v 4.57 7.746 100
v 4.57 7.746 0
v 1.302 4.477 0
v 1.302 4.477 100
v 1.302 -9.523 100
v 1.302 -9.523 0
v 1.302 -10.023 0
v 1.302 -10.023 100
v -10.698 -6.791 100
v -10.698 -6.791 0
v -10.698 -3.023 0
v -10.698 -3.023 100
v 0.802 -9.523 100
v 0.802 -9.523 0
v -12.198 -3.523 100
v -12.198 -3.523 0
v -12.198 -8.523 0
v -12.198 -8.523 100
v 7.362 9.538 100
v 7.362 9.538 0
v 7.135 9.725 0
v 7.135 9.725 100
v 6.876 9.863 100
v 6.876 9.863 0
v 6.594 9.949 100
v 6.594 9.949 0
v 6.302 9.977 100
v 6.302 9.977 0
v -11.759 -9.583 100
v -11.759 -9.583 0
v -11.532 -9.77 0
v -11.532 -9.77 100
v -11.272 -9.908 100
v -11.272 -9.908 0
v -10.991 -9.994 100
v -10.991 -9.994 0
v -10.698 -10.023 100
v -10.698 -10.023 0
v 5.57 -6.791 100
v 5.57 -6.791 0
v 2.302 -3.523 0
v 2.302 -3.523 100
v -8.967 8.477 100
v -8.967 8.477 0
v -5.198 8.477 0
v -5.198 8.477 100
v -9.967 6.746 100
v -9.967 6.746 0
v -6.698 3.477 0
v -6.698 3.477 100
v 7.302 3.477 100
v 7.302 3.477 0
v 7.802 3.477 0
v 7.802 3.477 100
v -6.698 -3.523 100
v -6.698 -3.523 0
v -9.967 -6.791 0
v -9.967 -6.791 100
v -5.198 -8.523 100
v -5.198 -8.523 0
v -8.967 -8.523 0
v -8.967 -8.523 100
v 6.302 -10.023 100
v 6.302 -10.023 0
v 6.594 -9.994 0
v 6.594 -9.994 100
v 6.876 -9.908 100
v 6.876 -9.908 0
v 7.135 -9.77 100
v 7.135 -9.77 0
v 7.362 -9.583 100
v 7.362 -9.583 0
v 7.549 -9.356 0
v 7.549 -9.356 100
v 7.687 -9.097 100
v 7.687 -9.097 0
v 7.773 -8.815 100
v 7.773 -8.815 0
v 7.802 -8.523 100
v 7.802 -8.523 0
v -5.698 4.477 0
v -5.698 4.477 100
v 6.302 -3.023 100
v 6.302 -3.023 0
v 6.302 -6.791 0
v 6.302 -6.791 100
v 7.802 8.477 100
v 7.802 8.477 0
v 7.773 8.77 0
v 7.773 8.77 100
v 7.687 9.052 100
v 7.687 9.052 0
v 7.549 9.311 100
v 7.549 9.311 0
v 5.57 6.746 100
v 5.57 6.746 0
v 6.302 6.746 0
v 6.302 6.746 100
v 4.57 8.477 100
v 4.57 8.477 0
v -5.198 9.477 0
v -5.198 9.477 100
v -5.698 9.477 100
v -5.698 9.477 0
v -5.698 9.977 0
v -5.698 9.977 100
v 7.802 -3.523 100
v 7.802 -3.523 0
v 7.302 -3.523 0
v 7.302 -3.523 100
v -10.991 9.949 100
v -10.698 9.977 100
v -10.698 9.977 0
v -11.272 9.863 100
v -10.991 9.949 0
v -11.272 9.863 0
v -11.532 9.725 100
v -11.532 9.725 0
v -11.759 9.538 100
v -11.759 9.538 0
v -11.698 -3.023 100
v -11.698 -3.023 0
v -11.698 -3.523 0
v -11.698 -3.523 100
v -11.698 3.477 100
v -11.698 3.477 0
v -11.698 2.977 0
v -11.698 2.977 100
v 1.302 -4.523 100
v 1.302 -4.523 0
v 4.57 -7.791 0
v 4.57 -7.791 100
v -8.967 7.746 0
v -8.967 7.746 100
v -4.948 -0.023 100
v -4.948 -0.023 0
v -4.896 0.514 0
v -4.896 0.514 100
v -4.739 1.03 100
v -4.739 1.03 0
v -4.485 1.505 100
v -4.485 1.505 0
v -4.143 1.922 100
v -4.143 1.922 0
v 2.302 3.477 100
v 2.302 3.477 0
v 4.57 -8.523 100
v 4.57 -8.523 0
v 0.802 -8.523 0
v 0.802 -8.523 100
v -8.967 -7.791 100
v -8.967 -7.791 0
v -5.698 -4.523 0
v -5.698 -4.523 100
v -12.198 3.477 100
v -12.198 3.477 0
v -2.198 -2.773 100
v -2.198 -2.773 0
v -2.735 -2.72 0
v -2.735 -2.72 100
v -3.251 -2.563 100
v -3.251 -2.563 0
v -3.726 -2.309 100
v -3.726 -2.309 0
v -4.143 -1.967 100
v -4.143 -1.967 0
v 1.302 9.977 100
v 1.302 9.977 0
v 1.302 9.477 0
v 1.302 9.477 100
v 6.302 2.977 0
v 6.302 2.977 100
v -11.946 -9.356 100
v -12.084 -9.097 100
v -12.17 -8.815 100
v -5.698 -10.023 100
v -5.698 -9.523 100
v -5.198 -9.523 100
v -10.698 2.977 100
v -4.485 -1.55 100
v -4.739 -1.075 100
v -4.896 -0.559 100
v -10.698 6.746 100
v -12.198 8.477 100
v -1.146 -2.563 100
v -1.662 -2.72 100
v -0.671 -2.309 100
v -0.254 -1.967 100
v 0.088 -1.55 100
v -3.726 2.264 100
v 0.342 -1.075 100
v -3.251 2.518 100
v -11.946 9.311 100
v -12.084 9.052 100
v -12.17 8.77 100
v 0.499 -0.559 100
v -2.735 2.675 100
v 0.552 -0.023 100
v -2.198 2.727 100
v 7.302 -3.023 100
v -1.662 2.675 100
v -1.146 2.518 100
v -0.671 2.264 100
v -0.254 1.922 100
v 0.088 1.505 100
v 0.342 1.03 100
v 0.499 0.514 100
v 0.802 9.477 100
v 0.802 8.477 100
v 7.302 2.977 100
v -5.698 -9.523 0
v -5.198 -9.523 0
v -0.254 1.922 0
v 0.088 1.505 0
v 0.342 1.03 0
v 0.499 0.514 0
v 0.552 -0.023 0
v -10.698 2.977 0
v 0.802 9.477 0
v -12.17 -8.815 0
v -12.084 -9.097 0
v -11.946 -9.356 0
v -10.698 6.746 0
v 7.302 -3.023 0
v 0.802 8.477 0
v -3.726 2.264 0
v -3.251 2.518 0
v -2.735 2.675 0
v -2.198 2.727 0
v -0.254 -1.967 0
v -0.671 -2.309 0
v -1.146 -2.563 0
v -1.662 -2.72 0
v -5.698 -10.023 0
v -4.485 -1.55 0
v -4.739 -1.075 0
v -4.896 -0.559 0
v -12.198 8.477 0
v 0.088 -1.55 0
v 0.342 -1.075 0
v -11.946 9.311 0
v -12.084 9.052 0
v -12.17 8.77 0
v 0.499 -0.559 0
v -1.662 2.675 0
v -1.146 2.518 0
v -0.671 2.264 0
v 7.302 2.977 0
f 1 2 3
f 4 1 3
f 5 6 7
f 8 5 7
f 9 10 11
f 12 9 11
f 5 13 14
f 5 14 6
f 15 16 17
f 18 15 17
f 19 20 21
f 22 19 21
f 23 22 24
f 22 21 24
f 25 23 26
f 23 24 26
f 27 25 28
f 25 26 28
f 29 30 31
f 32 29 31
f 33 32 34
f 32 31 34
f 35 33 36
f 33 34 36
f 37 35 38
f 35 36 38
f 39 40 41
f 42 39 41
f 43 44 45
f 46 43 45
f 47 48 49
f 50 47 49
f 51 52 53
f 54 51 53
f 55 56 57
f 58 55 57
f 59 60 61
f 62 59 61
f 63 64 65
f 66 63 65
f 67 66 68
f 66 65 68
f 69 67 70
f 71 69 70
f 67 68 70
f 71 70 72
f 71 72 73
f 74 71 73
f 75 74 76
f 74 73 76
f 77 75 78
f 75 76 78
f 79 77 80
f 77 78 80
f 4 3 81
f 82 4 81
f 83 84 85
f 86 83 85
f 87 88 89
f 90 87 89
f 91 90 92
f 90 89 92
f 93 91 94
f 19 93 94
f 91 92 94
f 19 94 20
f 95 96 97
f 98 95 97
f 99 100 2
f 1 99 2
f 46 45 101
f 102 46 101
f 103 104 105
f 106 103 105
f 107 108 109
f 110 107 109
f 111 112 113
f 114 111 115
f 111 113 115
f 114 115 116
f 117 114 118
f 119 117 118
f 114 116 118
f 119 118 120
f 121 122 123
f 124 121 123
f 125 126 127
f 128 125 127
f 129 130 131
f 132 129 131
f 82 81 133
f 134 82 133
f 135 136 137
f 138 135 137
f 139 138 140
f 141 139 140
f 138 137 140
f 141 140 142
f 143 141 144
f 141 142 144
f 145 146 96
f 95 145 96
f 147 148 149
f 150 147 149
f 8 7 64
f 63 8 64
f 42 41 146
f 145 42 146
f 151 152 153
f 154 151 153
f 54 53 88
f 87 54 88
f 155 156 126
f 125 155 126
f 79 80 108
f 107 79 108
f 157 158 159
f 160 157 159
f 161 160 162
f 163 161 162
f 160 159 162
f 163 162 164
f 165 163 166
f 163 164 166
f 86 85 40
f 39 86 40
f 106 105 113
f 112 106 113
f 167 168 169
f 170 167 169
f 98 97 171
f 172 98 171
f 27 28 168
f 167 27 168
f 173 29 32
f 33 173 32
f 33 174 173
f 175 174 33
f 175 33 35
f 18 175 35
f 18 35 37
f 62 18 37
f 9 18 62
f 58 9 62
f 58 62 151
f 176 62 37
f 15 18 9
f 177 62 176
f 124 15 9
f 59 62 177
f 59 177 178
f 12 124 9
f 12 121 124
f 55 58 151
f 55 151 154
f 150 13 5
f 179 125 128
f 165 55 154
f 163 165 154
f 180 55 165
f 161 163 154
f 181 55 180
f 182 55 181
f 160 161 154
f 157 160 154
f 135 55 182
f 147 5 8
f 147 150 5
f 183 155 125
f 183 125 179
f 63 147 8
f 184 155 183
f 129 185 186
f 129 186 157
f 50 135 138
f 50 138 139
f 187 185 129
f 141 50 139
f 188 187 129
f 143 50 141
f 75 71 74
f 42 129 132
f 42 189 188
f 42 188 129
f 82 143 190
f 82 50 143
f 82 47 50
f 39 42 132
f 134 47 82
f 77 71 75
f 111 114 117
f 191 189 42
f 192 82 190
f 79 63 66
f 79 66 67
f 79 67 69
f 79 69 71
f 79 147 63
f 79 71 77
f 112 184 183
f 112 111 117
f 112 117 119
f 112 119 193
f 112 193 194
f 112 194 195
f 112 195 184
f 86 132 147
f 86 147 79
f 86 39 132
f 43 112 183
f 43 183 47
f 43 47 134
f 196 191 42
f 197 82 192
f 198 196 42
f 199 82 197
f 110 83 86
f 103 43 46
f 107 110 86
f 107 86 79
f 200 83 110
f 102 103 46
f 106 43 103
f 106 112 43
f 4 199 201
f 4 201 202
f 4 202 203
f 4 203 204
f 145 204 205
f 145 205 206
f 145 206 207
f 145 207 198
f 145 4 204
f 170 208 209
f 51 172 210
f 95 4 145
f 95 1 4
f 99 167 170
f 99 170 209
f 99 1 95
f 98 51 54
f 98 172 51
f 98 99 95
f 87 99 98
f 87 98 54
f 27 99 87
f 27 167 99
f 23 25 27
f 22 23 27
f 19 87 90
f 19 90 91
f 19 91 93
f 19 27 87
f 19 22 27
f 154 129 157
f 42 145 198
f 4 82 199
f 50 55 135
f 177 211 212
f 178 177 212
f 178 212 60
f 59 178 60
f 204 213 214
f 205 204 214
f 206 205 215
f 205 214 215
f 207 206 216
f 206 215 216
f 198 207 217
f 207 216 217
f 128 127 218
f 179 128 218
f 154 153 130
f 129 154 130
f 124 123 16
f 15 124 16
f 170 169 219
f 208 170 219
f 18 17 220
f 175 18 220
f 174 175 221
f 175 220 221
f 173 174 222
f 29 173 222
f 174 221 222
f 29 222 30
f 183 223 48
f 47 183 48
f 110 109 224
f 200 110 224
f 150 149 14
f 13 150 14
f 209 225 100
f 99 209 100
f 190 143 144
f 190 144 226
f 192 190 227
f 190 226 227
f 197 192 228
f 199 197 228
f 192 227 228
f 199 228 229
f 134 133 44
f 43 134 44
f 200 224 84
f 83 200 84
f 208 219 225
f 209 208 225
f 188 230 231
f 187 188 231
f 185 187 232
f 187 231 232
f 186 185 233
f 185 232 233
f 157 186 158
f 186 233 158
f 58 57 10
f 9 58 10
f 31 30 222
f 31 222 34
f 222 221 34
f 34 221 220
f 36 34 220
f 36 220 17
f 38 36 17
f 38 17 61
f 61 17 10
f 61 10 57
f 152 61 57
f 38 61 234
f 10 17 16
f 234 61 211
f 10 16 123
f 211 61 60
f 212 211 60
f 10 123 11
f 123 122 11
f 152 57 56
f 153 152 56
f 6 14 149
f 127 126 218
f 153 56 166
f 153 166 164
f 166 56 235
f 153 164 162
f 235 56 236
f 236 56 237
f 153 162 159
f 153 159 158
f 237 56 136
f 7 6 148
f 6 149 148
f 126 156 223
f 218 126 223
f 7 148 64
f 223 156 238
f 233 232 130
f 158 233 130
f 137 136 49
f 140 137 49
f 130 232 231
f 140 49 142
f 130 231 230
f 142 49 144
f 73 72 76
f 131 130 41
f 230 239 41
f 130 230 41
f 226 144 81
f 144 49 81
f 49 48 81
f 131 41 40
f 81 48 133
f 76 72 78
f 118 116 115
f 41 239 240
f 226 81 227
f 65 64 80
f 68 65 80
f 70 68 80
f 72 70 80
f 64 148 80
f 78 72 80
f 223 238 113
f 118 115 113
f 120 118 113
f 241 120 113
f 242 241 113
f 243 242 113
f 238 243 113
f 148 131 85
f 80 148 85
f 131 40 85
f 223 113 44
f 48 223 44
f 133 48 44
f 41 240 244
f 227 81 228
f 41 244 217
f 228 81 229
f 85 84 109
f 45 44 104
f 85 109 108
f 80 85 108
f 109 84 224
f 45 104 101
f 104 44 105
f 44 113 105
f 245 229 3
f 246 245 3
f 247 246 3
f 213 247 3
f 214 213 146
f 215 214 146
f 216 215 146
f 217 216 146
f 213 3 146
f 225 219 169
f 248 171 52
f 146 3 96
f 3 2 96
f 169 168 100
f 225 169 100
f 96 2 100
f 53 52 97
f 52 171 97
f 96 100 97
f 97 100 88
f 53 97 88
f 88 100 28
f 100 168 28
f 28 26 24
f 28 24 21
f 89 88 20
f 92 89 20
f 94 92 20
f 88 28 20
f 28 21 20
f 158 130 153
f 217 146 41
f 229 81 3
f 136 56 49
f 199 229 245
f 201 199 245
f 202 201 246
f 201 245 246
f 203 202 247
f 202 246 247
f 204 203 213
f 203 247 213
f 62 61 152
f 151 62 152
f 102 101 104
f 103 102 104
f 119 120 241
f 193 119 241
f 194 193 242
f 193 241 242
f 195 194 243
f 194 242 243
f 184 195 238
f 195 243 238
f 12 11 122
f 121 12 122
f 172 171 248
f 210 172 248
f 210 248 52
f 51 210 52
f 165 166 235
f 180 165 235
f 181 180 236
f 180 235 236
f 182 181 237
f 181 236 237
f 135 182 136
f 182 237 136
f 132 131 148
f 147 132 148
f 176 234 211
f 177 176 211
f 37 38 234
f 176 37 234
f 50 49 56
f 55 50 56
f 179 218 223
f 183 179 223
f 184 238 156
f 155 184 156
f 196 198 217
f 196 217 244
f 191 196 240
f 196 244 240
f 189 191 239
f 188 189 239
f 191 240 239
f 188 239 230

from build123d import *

# Parameters (mm, degrees)
F1_DEPTH = 100


with BuildPart() as f1:
    # F0 (on Top) → F1 (new body)
    with BuildSketch(Plane.XY):
        with BuildLine():
            Line((-5.698349, -4.52252), (-1.198349, -4.52252))
            Line((-1.198349, -4.52252), (1.301651, -4.52252))
            Line((1.301651, -4.52252), (4.569926, -7.790794))
            Line((4.569926, -7.790794), (4.569926, -8.52252))
            Line((4.569926, -8.52252), (0.801651, -8.52252))
            Line((0.801651, -8.52252), (0.801651, -9.52252))
            Line((0.801651, -9.52252), (1.301651, -9.52252))
            Line((1.301651, -9.52252), (1.301651, -10.02252))
            Line((1.301651, -10.02252), (3.365556, -10.02252))
            Line((3.365556, -10.02252), (6.301651, -10.02252))
            ThreePointArc((6.301651, -10.02252), (6.875677, -9.908339), (7.362312, -9.58318))
            Line((7.362312, -9.58318), (6.301651, -8.52252))
            Line((6.301651, -8.52252), (-0.253805, -1.967063))
            ThreePointArc((-0.253805, -1.967063), (-1.145969, -2.563188), (-2.198349, -2.77252))
            ThreePointArc((-2.198349, -2.77252), (-3.250728, -2.563188), (-4.142892, -1.967063))
            Line((-4.142892, -1.967063), (-10.698349, -8.52252))
            Line((-10.698349, -8.52252), (-11.759009, -9.58318))
            ThreePointArc((-11.759009, -9.58318), (-11.272374, -9.908339), (-10.698349, -10.02252))
            Line((-10.698349, -10.02252), (-7.762253, -10.02252))
            Line((-7.762253, -10.02252), (-5.698349, -10.02252))
            Line((-5.698349, -10.02252), (-5.698349, -9.52252))
            Line((-5.698349, -9.52252), (-5.198349, -9.52252))
            Line((-5.198349, -9.52252), (-5.198349, -8.52252))
            Line((-5.198349, -8.52252), (-8.966623, -8.52252))
            Line((-8.966623, -8.52252), (-8.966623, -7.790794))
            Line((-8.966623, -7.790794), (-5.698349, -4.52252))
        make_face()
        with BuildLine():
            ThreePointArc((-12.198349, -8.52252), (-12.084168, -9.096545), (-11.759009, -9.58318))
            Line((-11.759009, -9.58318), (-10.698349, -8.52252))
            Line((-10.698349, -8.52252), (-4.142892, -1.967063))
            ThreePointArc((-4.142892, -1.967063), (-4.739017, -1.074899), (-4.948349, -0.02252))
            ThreePointArc((-4.948349, -0.02252), (-4.739017, 1.02986), (-4.142892, 1.922024))
            Line((-4.142892, 1.922024), (-10.698349, 8.47748))
            Line((-10.698349, 8.47748), (-11.759009, 9.538141))
            ThreePointArc((-11.759009, 9.538141), (-12.084168, 9.051506), (-12.198349, 8.47748))
            Line((-12.198349, 8.47748), (-12.198349, 5.541385))
            Line((-12.198349, 5.541385), (-12.198349, 3.47748))
            Line((-12.198349, 3.47748), (-11.698349, 3.47748))
            Line((-11.698349, 3.47748), (-11.698349, 2.97748))
            Line((-11.698349, 2.97748), (-10.698349, 2.97748))
            Line((-10.698349, 2.97748), (-10.698349, 6.745755))
            Line((-10.698349, 6.745755), (-9.966623, 6.745755))
            Line((-9.966623, 6.745755), (-6.698349, 3.47748))
            Line((-6.698349, 3.47748), (-6.698349, -1.02252))
            Line((-6.698349, -1.02252), (-6.698349, -3.52252))
            Line((-6.698349, -3.52252), (-9.966623, -6.790794))
            Line((-9.966623, -6.790794), (-10.698349, -6.790794))
            Line((-10.698349, -6.790794), (-10.698349, -3.02252))
            Line((-10.698349, -3.02252), (-11.698349, -3.02252))
            Line((-11.698349, -3.02252), (-11.698349, -3.52252))
            Line((-11.698349, -3.52252), (-12.198349, -3.52252))
            Line((-12.198349, -3.52252), (-12.198349, -5.586424))
            Line((-12.198349, -5.586424), (-12.198349, -8.52252))
        make_face()
        with BuildLine():
            Line((-10.698349, 8.47748), (-4.142892, 1.922024))
            ThreePointArc((-4.142892, 1.922024), (-3.250728, 2.518149), (-2.198349, 2.72748))
            ThreePointArc((-2.198349, 2.72748), (-1.145969, 2.518149), (-0.253805, 1.922024))
            Line((-0.253805, 1.922024), (6.301651, 8.47748))
            Line((6.301651, 8.47748), (7.362312, 9.538141))
            ThreePointArc((7.362312, 9.538141), (6.875677, 9.8633), (6.301651, 9.97748))
            Line((6.301651, 9.97748), (3.365556, 9.97748))
            Line((3.365556, 9.97748), (1.301651, 9.97748))
            Line((1.301651, 9.97748), (1.301651, 9.47748))
            Line((1.301651, 9.47748), (0.801651, 9.47748))
            Line((0.801651, 9.47748), (0.801651, 8.47748))
            Line((0.801651, 8.47748), (4.569926, 8.47748))
            Line((4.569926, 8.47748), (4.569926, 7.745755))
            Line((4.569926, 7.745755), (1.301651, 4.47748))
            Line((1.301651, 4.47748), (-1.198349, 4.47748))
            Line((-1.198349, 4.47748), (-3.198349, 4.47748))
            Line((-3.198349, 4.47748), (-5.698349, 4.47748))
            Line((-5.698349, 4.47748), (-8.966623, 7.745755))
            Line((-8.966623, 7.745755), (-8.966623, 8.47748))
            Line((-8.966623, 8.47748), (-5.198349, 8.47748))
            Line((-5.198349, 8.47748), (-5.198349, 9.47748))
            Line((-5.198349, 9.47748), (-5.698349, 9.47748))
            Line((-5.698349, 9.47748), (-5.698349, 9.97748))
            Line((-5.698349, 9.97748), (-7.762253, 9.97748))
            Line((-7.762253, 9.97748), (-10.698349, 9.97748))
            ThreePointArc((-10.698349, 9.97748), (-11.272374, 9.8633), (-11.759009, 9.538141))
            Line((-11.759009, 9.538141), (-10.698349, 8.47748))
        make_face()
        with BuildLine():
            Line((6.301651, -8.52252), (7.362312, -9.58318))
            ThreePointArc((7.362312, -9.58318), (7.687471, -9.096545), (7.801651, -8.52252))
            Line((7.801651, -8.52252), (7.801651, -5.586424))
            Line((7.801651, -5.586424), (7.801651, -3.52252))
            Line((7.801651, -3.52252), (7.301651, -3.52252))
            Line((7.301651, -3.52252), (7.301651, -3.02252))
            Line((7.301651, -3.02252), (6.301651, -3.02252))
            Line((6.301651, -3.02252), (6.301651, -6.790794))
            Line((6.301651, -6.790794), (5.569926, -6.790794))
            Line((5.569926, -6.790794), (2.301651, -3.52252))
            Line((2.301651, -3.52252), (2.301651, -1.02252))
            Line((2.301651, -1.02252), (2.301651, 0.97748))
            Line((2.301651, 0.97748), (2.301651, 3.47748))
            Line((2.301651, 3.47748), (5.569926, 6.745755))
            Line((5.569926, 6.745755), (6.301651, 6.745755))
            Line((6.301651, 6.745755), (6.301651, 2.97748))
            Line((6.301651, 2.97748), (7.301651, 2.97748))
            Line((7.301651, 2.97748), (7.301651, 3.47748))
            Line((7.301651, 3.47748), (7.801651, 3.47748))
            Line((7.801651, 3.47748), (7.801651, 5.541385))
            Line((7.801651, 5.541385), (7.801651, 8.47748))
            ThreePointArc((7.801651, 8.47748), (7.687471, 9.051506), (7.362312, 9.538141))
            Line((7.362312, 9.538141), (6.301651, 8.47748))
            Line((6.301651, 8.47748), (-0.253805, 1.922024))
            ThreePointArc((-0.253805, 1.922024), (0.34232, 1.02986), (0.551651, -0.02252))
            ThreePointArc((0.551651, -0.02252), (0.34232, -1.074899), (-0.253805, -1.967063))
            Line((-0.253805, -1.967063), (6.301651, -8.52252))
        make_face()
    extrude(amount=F1_DEPTH)


solid = f1.part
